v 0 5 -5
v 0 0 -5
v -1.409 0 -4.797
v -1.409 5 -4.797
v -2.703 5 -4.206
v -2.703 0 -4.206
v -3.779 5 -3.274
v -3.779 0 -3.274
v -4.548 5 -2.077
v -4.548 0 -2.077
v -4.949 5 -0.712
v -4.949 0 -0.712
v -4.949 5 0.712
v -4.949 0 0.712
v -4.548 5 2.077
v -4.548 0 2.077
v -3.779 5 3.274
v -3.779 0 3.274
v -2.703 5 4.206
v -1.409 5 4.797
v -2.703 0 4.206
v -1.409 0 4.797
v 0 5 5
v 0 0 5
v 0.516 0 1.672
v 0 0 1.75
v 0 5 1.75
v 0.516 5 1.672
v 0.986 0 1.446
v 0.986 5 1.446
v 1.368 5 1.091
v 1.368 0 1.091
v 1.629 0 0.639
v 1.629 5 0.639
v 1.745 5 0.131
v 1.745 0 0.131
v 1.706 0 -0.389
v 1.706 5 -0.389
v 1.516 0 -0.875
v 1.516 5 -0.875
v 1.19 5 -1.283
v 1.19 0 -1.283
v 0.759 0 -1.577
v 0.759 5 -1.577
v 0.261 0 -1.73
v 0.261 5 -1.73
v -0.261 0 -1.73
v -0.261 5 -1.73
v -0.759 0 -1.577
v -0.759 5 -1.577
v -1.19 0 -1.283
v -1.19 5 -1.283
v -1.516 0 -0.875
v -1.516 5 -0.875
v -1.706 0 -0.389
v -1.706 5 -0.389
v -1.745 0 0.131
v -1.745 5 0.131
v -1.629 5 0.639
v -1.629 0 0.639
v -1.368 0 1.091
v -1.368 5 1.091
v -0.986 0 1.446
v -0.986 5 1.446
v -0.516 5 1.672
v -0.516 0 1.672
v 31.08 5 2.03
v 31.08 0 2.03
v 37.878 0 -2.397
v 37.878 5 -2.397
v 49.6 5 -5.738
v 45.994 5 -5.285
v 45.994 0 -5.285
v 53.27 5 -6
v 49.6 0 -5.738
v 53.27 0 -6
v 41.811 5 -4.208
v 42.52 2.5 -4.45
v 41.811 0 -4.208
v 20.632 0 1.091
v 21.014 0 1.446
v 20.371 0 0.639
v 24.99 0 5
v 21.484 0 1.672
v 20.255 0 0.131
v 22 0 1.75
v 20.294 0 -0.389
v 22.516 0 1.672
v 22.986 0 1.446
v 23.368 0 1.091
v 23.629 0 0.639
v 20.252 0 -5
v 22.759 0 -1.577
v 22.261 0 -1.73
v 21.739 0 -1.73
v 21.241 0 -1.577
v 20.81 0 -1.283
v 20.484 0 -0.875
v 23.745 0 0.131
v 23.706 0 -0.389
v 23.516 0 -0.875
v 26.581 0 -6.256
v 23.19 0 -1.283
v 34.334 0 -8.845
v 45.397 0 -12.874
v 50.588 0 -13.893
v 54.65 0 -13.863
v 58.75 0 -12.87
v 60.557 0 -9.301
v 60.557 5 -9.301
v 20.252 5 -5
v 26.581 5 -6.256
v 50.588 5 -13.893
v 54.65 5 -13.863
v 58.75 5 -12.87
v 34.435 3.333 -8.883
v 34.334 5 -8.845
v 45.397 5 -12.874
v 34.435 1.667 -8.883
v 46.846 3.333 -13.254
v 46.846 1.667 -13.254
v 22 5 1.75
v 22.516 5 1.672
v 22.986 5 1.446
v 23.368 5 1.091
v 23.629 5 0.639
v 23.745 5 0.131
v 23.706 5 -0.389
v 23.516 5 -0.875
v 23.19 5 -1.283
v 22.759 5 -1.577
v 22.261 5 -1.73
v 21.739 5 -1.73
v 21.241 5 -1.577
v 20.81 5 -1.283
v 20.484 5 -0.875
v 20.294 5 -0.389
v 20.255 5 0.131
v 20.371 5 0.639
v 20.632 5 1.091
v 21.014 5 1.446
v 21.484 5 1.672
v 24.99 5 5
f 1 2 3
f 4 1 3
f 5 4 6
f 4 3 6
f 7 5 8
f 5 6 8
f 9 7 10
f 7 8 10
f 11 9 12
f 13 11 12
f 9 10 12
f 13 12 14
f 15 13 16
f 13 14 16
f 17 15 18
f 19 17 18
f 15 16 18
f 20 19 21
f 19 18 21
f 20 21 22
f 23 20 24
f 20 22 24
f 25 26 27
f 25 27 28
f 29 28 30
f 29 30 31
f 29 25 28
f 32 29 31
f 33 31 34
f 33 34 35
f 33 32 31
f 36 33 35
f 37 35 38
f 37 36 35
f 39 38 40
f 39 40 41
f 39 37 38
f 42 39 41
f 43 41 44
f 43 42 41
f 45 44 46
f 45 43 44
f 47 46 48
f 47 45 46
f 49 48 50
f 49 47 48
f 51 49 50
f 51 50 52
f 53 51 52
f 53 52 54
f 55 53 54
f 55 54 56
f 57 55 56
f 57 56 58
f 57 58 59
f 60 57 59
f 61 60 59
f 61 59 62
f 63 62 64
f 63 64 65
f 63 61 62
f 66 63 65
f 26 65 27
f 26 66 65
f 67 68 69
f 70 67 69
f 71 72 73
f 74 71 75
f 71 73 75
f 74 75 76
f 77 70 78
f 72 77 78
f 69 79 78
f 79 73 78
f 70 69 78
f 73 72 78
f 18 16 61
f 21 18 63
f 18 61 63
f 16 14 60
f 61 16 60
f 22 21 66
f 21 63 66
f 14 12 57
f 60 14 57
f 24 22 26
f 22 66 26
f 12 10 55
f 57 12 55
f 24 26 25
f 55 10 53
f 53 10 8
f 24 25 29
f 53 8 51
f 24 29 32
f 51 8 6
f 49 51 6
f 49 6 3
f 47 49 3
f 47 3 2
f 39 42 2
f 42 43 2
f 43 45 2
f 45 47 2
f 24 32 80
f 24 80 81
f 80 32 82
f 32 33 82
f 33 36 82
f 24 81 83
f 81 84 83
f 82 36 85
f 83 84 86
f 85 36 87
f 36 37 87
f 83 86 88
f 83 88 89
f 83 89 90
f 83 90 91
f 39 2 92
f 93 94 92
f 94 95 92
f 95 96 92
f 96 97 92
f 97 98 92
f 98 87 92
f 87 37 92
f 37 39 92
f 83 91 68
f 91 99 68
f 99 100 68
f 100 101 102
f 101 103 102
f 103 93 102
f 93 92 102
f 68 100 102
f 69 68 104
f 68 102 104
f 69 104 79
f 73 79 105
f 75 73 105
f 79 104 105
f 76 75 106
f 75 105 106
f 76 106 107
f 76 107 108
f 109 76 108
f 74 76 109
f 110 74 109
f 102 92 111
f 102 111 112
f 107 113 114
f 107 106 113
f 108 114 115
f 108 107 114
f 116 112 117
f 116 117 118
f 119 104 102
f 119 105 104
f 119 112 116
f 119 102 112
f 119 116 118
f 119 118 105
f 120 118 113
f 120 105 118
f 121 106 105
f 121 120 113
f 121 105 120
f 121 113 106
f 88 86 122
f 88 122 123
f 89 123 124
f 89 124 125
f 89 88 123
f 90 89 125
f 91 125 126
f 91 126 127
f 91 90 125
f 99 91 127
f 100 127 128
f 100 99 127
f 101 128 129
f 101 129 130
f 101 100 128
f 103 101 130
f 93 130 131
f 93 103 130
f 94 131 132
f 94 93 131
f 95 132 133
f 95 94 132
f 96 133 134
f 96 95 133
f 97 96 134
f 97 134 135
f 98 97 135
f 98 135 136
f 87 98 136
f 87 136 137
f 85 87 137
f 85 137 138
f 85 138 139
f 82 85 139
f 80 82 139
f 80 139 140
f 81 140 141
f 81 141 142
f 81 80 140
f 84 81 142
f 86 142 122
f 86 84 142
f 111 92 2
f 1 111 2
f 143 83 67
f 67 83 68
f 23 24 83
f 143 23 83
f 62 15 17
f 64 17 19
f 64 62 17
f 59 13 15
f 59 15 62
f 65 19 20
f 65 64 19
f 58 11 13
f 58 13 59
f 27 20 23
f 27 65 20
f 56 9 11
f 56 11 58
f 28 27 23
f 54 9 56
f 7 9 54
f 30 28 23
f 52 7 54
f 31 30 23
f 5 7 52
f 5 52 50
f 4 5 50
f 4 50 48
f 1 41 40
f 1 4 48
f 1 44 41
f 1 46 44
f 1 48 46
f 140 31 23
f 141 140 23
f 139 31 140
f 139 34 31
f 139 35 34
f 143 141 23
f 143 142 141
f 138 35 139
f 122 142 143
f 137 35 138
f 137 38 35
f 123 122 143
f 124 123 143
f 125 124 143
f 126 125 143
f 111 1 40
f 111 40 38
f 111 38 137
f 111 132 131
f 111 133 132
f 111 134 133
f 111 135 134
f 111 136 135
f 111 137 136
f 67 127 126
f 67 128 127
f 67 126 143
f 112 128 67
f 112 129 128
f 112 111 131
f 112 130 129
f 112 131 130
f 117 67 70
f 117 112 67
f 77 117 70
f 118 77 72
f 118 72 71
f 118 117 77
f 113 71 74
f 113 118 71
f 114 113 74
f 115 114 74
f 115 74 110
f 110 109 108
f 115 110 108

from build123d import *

# Parameters (mm, degrees)
SKETCH1_R           = 5
SKETCH1_R_2         = 1.75
BOSS_EXTRUDE1_DEPTH = 5
BOSS_EXTRUDE2_START = -5
BOSS_EXTRUDE2_DEPTH = 5


with BuildPart() as part:
    # Sketch1 → Boss-Extrude1 (new body)
    # profile 1 of 3: a face of its own
    with BuildSketch(Plane(origin=(0, 0, 0), x_dir=(1, 0, 0), z_dir=(0, 1, 0))):
        Circle(SKETCH1_R)
        with Locations(Location((0, 0, 0), (0, 0, 270))):
            Circle(SKETCH1_R_2, mode=Mode.SUBTRACT)
    # profile 2 of 3: a face of its own
    with BuildSketch(Plane(origin=(0, 0, 0), x_dir=(1, 0, 0), z_dir=(0, 1, 0))):
        with BuildLine():
            Line((22, 5), (7e-09, 5))
            ThreePointArc((7e-09, 5), (3.535533908, 3.535533903), (5, 0))
            ThreePointArc((5, 0), (3.535533907, -3.535533905), (3e-09, -5))
            Line((3e-09, -5), (22, -5))
            ThreePointArc((22, -5), (17, 0), (22, 5))
        make_face()
    # profile 3 of 3: a face of its own
    with BuildSketch(Plane(origin=(0, 0, 0), x_dir=(1, 0, 0), z_dir=(0, 1, 0))):
        with Locations((22, 0)):
            Circle(SKETCH1_R)
        with Locations(Location((22, 0, 0), (0, 0, 270))):
            Circle(SKETCH1_R_2, mode=Mode.SUBTRACT)
    extrude(amount=BOSS_EXTRUDE1_DEPTH)

    # Sketch2 → Boss-Extrude2 (add)
    with BuildSketch(Plane(origin=(0, 5, 0), x_dir=(1, 0, 0), z_dir=(0, 1, 0)).offset(BOSS_EXTRUDE2_START)):
        with BuildLine():
            ThreePointArc((22, 5), (27, 0), (22, -5))
            Line((22, -5), (24.99, -5))
            Line((24.99, -5), (31.08, -2.029708536))
            add(Edge.make_bspline(
                [(31.08, -2.029708536), (34.749760943, 0.550345092), (41.451086478, 5.261763501), (49.588688562, 5.770056828), (53.27, 6)],
                knots=[0, 0, 0, 0, 0.547617173, 1, 1, 1, 1], degree=3))
            Line((53.27, 6), (60.557013712, 9.301428655))
            Line((60.557013712, 9.301428655), (58.75, 12.87))
            add(Edge.make_bspline(
                [(20.251877892, 5), (35.741313443, 6.892403077), (46.679161054, 17.378023899), (58.75, 12.87)],
                knots=[0.158187399, 0.158187399, 0.158187399, 0.158187399, 1, 1, 1, 1], degree=3))
            Line((20.251877892, 5), (22, 5))
        make_face()
    extrude(amount=BOSS_EXTRUDE2_DEPTH)


solid = part.part
